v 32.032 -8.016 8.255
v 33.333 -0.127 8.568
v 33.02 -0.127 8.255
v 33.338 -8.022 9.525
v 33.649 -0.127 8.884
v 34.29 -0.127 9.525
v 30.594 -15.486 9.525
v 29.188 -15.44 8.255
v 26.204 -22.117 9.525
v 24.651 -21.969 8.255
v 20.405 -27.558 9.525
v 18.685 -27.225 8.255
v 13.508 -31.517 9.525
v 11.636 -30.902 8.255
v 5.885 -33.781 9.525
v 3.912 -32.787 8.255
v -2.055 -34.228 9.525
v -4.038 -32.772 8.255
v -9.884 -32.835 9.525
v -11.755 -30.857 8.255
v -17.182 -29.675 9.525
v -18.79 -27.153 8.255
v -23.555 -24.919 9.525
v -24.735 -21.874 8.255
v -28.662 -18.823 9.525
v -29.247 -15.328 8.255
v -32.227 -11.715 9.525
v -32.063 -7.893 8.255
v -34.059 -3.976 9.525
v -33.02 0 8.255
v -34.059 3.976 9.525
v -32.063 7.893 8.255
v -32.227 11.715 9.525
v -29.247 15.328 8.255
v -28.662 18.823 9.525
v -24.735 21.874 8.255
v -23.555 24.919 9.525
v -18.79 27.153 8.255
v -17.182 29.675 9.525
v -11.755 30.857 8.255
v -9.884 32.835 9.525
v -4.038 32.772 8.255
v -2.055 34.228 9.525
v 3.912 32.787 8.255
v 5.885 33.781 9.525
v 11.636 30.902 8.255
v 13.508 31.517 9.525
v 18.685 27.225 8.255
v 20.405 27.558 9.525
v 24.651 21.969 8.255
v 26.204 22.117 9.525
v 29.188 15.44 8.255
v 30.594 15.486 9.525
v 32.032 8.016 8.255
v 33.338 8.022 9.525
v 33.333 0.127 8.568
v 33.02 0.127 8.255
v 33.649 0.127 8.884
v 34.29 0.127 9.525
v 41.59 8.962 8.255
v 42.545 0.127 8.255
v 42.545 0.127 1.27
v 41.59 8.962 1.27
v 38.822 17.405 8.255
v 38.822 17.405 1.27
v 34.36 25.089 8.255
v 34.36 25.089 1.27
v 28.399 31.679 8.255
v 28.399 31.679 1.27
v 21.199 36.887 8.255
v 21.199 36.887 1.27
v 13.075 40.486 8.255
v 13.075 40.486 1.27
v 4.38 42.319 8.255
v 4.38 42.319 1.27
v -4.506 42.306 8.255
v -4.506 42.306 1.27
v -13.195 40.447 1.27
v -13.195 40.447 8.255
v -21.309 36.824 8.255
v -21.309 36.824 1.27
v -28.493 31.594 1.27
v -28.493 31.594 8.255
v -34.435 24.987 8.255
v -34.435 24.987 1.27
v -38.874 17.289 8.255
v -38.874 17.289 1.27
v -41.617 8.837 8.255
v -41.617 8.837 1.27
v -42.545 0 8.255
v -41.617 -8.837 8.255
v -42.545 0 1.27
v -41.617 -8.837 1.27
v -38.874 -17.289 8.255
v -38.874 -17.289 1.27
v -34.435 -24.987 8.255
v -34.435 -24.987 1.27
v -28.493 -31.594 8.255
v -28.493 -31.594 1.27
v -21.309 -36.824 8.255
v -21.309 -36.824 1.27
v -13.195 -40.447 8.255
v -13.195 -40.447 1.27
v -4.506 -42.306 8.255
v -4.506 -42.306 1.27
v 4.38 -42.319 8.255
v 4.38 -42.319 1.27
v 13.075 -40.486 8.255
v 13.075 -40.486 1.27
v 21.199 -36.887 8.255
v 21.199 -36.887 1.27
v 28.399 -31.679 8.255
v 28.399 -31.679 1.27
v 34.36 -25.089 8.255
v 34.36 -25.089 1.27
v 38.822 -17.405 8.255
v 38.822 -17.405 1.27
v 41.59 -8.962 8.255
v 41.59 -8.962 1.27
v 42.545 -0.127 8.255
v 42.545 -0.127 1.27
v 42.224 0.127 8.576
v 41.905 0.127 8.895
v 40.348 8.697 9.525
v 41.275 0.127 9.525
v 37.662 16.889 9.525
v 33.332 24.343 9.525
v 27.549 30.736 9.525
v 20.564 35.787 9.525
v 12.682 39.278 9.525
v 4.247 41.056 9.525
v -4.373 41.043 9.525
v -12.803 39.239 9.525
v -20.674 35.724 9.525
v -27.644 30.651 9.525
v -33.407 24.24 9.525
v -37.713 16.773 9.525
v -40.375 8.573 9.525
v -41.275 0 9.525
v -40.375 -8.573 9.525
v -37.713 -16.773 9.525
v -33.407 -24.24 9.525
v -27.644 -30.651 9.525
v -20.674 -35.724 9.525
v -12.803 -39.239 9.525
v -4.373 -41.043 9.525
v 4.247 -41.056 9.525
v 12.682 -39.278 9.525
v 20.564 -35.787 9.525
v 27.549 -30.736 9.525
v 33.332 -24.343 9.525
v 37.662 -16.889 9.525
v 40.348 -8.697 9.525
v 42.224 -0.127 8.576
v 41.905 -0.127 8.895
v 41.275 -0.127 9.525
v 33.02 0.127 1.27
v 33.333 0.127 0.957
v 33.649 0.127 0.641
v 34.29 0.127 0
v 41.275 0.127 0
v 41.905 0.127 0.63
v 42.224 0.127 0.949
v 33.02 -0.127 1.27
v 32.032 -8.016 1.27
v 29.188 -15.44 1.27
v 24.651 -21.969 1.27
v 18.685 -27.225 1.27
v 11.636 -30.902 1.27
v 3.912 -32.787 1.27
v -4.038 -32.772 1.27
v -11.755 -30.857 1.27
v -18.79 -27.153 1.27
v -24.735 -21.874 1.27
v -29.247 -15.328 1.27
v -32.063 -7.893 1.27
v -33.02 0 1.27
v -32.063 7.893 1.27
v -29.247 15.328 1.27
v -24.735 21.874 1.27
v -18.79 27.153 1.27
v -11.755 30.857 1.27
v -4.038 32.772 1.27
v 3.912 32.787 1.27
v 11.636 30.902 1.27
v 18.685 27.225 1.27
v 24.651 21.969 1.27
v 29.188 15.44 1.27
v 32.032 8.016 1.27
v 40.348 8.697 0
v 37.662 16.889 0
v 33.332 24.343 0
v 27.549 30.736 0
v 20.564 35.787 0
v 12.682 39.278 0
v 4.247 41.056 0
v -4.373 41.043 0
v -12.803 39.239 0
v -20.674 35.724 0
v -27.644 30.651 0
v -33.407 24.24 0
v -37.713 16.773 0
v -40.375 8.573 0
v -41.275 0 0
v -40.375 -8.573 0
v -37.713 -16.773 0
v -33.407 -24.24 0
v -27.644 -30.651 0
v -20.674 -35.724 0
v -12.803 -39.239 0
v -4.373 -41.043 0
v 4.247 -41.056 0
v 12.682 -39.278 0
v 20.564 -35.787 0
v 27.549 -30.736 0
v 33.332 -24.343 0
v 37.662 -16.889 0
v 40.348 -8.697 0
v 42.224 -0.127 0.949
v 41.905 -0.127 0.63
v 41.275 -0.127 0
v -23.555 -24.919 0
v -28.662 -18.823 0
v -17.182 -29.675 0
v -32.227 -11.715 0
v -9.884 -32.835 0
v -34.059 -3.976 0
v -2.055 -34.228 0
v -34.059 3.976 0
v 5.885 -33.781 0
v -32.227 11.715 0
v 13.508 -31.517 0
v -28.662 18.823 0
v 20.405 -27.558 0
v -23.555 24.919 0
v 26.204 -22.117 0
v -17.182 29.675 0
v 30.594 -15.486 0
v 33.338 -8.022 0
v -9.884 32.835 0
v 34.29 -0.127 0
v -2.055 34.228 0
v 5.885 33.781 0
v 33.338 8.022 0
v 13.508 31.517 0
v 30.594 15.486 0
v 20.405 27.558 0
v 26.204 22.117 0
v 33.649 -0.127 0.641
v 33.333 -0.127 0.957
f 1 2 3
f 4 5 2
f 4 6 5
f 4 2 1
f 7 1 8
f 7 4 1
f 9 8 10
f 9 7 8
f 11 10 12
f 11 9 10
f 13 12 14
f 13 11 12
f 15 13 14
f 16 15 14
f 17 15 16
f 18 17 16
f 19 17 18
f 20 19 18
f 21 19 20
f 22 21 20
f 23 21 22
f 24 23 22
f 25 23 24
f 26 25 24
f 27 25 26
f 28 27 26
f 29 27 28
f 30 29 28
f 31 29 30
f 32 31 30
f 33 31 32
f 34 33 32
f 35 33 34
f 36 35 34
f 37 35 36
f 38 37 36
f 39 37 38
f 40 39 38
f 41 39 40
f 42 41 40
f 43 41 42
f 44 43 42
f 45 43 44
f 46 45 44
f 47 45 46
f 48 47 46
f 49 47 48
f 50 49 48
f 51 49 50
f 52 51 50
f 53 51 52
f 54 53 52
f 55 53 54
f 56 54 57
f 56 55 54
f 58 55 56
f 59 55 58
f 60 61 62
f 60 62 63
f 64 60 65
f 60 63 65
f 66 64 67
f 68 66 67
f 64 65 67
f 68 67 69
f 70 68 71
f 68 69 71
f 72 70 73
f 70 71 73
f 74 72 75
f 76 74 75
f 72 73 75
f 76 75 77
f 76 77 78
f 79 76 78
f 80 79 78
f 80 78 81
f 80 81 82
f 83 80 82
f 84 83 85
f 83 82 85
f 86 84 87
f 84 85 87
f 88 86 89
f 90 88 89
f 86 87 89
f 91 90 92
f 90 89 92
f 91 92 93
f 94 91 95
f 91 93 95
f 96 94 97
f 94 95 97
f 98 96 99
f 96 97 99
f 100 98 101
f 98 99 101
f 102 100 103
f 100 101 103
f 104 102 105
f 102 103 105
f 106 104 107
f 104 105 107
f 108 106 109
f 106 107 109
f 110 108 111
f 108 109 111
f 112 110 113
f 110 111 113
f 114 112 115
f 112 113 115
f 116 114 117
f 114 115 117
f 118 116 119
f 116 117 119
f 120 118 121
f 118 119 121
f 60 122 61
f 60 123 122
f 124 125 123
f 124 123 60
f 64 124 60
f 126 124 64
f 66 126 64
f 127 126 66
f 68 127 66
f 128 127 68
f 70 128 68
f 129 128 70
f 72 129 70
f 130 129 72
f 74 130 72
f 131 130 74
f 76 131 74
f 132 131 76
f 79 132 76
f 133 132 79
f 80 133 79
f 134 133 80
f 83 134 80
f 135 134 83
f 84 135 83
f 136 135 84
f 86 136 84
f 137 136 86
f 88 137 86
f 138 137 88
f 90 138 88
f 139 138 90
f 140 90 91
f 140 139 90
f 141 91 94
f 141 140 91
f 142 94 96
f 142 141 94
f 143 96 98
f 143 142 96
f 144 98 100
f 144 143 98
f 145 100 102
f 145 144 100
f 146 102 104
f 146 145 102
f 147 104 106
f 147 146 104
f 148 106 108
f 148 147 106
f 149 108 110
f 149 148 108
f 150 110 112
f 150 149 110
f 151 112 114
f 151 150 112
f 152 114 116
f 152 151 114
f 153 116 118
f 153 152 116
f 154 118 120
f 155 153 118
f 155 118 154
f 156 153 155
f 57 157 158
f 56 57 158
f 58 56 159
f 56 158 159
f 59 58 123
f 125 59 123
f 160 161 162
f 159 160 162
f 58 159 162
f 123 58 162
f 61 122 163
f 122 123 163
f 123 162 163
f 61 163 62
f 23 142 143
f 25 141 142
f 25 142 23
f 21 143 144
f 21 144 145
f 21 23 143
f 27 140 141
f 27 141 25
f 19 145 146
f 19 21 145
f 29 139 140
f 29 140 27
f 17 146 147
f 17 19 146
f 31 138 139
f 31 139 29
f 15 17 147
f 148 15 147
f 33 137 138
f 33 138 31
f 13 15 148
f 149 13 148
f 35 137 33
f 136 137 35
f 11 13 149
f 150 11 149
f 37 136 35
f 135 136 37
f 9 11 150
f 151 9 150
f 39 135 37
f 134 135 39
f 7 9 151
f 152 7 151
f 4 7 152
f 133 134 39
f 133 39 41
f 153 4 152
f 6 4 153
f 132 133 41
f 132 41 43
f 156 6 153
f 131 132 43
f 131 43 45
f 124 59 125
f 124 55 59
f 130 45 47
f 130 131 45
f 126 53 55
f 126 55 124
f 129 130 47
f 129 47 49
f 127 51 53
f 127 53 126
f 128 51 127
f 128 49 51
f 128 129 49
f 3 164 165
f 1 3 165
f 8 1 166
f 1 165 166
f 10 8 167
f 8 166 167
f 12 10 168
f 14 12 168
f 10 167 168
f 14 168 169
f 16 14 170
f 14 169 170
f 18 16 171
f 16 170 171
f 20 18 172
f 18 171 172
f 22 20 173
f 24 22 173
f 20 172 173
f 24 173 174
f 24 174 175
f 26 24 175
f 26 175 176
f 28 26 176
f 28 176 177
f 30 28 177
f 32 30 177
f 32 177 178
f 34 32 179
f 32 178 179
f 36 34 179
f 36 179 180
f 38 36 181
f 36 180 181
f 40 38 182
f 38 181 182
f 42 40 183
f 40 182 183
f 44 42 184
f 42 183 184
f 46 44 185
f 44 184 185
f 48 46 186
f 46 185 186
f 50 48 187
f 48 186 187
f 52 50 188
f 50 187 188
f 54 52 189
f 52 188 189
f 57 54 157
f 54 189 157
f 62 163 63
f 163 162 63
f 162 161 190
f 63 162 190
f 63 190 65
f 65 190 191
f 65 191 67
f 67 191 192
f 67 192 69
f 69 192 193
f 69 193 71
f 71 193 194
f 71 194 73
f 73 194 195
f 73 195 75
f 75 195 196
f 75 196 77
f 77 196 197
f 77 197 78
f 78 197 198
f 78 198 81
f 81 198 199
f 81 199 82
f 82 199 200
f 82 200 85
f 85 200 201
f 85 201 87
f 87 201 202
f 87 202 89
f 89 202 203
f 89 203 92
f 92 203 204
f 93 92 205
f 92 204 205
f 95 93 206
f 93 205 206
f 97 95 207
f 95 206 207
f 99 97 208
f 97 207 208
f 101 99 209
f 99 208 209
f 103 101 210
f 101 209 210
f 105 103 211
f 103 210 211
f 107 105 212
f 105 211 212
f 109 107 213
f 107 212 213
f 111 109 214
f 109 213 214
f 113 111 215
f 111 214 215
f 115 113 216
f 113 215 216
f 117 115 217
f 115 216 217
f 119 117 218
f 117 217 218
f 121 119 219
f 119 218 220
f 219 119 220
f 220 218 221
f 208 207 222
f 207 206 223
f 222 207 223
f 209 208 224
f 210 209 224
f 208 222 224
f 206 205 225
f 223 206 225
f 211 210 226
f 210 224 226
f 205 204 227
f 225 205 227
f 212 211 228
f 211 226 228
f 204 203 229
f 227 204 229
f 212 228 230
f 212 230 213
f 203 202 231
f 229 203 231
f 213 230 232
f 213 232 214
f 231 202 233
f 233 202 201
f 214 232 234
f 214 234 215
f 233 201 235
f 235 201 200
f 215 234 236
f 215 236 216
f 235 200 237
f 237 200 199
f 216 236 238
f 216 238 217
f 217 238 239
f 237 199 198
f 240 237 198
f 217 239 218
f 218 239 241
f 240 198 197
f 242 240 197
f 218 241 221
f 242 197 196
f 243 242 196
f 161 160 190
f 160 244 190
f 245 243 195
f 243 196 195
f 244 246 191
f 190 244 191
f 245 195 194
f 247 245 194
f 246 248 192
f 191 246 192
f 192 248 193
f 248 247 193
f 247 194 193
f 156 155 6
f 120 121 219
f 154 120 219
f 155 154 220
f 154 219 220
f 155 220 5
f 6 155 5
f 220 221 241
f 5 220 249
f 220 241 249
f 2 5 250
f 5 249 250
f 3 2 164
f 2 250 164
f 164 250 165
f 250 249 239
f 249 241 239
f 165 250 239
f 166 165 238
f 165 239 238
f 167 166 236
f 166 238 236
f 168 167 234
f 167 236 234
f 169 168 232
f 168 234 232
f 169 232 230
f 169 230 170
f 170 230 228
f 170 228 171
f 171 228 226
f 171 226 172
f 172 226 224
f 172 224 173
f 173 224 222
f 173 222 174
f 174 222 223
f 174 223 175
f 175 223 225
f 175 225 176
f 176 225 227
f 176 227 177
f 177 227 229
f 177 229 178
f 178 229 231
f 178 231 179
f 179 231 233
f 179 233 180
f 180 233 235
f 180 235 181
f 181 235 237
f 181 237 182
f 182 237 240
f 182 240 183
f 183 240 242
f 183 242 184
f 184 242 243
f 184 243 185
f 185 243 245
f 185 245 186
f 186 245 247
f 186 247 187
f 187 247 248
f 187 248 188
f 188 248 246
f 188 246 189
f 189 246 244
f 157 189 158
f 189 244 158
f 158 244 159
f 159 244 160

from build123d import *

# Parameters (mm, degrees)
F1_DEPTH = 9.525
F2_SIZE  = 1.27


with BuildPart() as f1:
    # F0 (on Top) → F1 (new body)
    with BuildSketch(Plane.XY):
        with BuildLine():
            ThreePointArc((33.019756, -0.127), (-33.02, 0), (33.019756, 0.126999))
            Line((33.019756, 0.126999), (42.54481, 0.126999))
            ThreePointArc((42.54481, 0.126999), (-42.545, 0), (42.54481, -0.126999))
            Line((42.54481, -0.126999), (33.019756, -0.127))
        make_face()
    extrude(amount=F1_DEPTH)

    # F2
    f2_edges = [f1.edges().sort_by_distance(p)[0] for p in [
        (-42.545, 0, 9.525),
        (-42.545, 0, 0),
        (-33.02, 0, 9.525),
        (-33.02, 0, 0),
    ]]
    chamfer(f2_edges, length=F2_SIZE)


solid = f1.part
